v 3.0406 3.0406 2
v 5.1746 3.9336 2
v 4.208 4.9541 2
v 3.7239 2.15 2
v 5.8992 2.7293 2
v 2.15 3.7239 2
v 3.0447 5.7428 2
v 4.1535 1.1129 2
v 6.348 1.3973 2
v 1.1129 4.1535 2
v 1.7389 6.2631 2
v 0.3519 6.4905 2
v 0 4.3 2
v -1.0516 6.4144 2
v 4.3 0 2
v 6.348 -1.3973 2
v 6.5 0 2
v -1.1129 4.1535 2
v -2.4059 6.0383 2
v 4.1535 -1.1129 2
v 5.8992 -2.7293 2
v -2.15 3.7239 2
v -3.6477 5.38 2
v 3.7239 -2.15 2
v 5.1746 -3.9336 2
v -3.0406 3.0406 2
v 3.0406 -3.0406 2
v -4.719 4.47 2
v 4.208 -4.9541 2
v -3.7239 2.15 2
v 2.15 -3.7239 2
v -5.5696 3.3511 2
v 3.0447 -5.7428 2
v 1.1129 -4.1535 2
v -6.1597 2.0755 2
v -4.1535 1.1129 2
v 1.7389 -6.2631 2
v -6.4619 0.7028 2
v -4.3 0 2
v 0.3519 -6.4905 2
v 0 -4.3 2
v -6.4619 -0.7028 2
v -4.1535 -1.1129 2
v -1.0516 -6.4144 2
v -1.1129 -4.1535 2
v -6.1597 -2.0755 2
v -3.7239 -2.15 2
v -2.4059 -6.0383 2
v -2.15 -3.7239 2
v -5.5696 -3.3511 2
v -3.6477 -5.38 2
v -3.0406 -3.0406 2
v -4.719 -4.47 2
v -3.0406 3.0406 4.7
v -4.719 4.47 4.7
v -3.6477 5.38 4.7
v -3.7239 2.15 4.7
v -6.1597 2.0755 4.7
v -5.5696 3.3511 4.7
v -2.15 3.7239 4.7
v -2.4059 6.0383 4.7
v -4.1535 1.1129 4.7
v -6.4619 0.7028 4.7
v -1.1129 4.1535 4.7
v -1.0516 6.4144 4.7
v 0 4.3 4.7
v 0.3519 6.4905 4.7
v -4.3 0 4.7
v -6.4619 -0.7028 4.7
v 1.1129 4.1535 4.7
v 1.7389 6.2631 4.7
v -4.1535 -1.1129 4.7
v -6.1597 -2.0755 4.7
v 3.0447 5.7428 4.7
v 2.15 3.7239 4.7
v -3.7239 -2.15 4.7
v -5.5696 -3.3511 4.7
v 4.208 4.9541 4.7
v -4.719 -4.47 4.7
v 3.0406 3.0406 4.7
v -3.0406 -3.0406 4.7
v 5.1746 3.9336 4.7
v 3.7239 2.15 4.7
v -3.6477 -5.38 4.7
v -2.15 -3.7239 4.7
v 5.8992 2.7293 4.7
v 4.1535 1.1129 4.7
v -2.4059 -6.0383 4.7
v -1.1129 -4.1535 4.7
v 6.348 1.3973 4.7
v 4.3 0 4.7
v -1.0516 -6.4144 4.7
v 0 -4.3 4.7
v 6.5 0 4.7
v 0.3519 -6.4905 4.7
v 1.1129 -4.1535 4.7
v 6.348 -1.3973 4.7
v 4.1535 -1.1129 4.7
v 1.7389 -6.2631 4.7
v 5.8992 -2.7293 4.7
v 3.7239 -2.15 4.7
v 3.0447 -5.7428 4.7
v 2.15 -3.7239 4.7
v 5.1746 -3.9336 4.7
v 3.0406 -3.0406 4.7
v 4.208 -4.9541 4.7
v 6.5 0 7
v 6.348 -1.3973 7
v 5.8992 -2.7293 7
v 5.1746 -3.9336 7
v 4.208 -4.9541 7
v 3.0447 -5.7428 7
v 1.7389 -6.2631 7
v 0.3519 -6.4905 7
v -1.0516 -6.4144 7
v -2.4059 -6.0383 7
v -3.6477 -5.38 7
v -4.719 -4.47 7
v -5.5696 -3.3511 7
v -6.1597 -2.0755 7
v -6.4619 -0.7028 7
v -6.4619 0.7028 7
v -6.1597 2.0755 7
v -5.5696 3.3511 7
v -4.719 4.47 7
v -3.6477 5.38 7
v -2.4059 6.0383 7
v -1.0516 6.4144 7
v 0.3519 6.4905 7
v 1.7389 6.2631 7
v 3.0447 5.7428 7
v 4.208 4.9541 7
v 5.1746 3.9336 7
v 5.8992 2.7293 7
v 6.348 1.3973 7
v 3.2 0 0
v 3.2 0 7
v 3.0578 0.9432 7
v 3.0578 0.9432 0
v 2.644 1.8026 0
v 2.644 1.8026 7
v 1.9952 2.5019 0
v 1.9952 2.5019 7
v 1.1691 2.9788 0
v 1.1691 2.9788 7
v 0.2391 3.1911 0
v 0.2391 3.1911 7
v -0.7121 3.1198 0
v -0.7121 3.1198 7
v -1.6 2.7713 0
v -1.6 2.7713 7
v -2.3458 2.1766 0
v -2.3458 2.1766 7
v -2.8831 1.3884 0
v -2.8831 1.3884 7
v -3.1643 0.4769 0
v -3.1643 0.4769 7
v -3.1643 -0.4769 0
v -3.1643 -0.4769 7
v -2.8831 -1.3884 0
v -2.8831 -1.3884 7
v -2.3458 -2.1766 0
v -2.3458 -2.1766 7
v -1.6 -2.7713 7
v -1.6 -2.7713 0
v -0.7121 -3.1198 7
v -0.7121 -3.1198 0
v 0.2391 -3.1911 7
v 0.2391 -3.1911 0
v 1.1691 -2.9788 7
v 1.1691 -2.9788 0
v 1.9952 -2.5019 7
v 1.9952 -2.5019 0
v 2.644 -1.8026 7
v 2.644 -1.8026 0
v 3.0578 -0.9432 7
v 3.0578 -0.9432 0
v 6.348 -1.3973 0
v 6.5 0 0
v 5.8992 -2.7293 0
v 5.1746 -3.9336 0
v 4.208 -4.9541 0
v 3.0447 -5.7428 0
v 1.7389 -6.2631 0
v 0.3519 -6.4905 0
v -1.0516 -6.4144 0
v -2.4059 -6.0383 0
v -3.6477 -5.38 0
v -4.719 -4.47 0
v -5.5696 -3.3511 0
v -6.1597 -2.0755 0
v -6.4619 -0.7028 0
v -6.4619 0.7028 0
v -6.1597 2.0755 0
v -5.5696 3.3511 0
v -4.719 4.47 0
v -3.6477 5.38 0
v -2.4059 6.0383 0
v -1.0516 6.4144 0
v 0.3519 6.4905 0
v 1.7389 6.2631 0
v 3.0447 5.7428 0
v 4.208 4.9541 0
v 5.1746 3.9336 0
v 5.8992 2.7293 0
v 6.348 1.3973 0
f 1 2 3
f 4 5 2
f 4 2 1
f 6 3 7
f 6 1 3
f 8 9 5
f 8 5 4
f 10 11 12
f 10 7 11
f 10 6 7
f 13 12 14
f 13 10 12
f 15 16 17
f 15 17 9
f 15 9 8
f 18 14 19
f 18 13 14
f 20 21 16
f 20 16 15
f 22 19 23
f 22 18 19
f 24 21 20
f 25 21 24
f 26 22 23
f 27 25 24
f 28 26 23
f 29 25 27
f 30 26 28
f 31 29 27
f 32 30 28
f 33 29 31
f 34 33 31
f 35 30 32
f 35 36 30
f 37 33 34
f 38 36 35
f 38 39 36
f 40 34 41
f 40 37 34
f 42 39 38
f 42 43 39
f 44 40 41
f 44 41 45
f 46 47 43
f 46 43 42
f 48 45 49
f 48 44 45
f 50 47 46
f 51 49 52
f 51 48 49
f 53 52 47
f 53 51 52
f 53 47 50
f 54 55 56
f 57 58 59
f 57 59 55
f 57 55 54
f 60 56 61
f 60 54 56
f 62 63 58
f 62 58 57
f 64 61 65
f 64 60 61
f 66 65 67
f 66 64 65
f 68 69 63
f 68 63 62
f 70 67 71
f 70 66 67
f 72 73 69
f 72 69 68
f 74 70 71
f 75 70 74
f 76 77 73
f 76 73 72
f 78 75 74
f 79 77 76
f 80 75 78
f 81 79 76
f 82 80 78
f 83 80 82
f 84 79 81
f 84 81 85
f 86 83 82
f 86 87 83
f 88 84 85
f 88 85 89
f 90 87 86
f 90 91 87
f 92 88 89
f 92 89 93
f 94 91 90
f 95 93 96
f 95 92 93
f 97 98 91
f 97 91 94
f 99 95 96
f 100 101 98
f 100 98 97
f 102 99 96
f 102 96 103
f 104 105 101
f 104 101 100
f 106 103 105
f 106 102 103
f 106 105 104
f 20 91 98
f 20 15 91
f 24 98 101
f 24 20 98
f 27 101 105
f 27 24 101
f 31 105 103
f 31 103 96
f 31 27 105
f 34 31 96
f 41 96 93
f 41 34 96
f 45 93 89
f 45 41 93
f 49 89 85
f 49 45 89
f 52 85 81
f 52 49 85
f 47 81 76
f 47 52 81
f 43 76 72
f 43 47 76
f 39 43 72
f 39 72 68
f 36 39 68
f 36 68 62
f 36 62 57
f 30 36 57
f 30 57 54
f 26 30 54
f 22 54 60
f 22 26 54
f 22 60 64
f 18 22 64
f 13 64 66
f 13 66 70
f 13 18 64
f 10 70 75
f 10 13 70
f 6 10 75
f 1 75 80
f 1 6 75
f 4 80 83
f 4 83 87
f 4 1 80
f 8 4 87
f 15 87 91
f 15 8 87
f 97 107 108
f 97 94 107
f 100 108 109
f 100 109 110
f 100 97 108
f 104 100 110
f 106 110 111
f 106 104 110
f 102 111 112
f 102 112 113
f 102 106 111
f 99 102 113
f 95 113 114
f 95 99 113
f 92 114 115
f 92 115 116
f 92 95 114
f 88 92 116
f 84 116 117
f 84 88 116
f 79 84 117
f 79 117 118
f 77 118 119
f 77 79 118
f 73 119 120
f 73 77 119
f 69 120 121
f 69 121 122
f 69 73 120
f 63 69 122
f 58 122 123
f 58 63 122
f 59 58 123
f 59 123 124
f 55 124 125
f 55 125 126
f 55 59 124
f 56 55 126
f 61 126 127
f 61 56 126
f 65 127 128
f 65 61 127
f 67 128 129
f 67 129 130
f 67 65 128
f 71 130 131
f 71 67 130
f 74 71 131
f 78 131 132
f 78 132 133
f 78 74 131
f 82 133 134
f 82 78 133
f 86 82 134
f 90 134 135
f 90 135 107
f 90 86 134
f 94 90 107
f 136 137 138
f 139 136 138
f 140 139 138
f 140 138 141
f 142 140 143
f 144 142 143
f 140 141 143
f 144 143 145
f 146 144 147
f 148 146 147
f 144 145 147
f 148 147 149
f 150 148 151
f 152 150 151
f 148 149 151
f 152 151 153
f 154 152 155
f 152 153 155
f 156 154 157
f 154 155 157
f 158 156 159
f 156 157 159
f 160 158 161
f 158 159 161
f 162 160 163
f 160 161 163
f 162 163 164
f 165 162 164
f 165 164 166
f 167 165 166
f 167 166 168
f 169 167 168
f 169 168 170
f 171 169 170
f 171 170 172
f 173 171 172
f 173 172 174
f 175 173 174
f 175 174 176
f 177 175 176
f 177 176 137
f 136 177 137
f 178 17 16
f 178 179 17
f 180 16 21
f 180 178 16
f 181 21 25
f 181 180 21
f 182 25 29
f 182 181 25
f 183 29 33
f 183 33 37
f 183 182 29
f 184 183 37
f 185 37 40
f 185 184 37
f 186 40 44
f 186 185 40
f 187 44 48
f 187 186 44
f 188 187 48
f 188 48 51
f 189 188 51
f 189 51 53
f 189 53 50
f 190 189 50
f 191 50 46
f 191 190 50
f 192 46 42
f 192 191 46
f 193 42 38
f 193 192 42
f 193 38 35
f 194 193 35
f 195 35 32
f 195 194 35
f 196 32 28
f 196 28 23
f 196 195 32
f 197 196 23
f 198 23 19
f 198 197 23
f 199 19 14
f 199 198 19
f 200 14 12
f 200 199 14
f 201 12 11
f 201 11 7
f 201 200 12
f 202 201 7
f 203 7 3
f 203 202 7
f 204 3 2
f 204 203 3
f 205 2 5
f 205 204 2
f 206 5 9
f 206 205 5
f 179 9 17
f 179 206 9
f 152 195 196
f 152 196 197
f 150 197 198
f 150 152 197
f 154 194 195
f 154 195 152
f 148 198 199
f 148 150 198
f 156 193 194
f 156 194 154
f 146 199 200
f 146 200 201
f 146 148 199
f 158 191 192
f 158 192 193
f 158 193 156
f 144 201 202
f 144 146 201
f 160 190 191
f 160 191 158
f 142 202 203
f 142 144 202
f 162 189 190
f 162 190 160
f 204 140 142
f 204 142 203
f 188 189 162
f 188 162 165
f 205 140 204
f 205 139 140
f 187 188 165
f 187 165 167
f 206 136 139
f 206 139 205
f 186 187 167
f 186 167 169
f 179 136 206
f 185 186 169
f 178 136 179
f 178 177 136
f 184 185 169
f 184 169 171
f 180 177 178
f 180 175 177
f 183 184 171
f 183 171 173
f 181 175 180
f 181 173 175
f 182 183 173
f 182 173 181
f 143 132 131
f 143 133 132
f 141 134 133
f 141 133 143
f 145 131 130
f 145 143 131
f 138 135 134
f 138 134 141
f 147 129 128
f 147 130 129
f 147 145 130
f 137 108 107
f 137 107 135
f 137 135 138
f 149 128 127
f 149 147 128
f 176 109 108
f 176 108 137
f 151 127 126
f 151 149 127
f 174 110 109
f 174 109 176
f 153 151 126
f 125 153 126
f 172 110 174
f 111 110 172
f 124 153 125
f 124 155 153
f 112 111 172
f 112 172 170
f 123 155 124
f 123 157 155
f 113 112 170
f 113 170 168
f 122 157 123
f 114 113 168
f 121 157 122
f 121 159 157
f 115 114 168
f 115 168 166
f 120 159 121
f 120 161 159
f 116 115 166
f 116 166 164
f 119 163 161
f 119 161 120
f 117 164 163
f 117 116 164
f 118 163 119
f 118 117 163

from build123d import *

# Parameters (mm, degrees)
FURO_COM_FOLGA_DE_M61_D = 6.4


with BuildPart() as part:
    # Esboço1 → Revolução1 (revolve)
    with BuildSketch(Plane(origin=(0, 0, 0), x_dir=(0, 0, -1), z_dir=(1, 0, 0))):
        Polygon((-0.44395252, 0), (0, 0), (0, 6.5), (-2, 6.5), (-2, 4.3), (-4.7, 4.3), (-4.7, 6.5), (-7, 6.5), (-7, 0), align=None)
    revolve(axis=Axis((0, 0, 7), (0, 0, -1)))

    # Furo com folga de M61 (through all)
    with Locations(Plane(origin=(0, 0, 0), x_dir=(-1, 0, 0), z_dir=(0, 0, -1))):
        with Locations((0, 0)):
            Hole(FURO_COM_FOLGA_DE_M61_D / 2)


solid = part.part
